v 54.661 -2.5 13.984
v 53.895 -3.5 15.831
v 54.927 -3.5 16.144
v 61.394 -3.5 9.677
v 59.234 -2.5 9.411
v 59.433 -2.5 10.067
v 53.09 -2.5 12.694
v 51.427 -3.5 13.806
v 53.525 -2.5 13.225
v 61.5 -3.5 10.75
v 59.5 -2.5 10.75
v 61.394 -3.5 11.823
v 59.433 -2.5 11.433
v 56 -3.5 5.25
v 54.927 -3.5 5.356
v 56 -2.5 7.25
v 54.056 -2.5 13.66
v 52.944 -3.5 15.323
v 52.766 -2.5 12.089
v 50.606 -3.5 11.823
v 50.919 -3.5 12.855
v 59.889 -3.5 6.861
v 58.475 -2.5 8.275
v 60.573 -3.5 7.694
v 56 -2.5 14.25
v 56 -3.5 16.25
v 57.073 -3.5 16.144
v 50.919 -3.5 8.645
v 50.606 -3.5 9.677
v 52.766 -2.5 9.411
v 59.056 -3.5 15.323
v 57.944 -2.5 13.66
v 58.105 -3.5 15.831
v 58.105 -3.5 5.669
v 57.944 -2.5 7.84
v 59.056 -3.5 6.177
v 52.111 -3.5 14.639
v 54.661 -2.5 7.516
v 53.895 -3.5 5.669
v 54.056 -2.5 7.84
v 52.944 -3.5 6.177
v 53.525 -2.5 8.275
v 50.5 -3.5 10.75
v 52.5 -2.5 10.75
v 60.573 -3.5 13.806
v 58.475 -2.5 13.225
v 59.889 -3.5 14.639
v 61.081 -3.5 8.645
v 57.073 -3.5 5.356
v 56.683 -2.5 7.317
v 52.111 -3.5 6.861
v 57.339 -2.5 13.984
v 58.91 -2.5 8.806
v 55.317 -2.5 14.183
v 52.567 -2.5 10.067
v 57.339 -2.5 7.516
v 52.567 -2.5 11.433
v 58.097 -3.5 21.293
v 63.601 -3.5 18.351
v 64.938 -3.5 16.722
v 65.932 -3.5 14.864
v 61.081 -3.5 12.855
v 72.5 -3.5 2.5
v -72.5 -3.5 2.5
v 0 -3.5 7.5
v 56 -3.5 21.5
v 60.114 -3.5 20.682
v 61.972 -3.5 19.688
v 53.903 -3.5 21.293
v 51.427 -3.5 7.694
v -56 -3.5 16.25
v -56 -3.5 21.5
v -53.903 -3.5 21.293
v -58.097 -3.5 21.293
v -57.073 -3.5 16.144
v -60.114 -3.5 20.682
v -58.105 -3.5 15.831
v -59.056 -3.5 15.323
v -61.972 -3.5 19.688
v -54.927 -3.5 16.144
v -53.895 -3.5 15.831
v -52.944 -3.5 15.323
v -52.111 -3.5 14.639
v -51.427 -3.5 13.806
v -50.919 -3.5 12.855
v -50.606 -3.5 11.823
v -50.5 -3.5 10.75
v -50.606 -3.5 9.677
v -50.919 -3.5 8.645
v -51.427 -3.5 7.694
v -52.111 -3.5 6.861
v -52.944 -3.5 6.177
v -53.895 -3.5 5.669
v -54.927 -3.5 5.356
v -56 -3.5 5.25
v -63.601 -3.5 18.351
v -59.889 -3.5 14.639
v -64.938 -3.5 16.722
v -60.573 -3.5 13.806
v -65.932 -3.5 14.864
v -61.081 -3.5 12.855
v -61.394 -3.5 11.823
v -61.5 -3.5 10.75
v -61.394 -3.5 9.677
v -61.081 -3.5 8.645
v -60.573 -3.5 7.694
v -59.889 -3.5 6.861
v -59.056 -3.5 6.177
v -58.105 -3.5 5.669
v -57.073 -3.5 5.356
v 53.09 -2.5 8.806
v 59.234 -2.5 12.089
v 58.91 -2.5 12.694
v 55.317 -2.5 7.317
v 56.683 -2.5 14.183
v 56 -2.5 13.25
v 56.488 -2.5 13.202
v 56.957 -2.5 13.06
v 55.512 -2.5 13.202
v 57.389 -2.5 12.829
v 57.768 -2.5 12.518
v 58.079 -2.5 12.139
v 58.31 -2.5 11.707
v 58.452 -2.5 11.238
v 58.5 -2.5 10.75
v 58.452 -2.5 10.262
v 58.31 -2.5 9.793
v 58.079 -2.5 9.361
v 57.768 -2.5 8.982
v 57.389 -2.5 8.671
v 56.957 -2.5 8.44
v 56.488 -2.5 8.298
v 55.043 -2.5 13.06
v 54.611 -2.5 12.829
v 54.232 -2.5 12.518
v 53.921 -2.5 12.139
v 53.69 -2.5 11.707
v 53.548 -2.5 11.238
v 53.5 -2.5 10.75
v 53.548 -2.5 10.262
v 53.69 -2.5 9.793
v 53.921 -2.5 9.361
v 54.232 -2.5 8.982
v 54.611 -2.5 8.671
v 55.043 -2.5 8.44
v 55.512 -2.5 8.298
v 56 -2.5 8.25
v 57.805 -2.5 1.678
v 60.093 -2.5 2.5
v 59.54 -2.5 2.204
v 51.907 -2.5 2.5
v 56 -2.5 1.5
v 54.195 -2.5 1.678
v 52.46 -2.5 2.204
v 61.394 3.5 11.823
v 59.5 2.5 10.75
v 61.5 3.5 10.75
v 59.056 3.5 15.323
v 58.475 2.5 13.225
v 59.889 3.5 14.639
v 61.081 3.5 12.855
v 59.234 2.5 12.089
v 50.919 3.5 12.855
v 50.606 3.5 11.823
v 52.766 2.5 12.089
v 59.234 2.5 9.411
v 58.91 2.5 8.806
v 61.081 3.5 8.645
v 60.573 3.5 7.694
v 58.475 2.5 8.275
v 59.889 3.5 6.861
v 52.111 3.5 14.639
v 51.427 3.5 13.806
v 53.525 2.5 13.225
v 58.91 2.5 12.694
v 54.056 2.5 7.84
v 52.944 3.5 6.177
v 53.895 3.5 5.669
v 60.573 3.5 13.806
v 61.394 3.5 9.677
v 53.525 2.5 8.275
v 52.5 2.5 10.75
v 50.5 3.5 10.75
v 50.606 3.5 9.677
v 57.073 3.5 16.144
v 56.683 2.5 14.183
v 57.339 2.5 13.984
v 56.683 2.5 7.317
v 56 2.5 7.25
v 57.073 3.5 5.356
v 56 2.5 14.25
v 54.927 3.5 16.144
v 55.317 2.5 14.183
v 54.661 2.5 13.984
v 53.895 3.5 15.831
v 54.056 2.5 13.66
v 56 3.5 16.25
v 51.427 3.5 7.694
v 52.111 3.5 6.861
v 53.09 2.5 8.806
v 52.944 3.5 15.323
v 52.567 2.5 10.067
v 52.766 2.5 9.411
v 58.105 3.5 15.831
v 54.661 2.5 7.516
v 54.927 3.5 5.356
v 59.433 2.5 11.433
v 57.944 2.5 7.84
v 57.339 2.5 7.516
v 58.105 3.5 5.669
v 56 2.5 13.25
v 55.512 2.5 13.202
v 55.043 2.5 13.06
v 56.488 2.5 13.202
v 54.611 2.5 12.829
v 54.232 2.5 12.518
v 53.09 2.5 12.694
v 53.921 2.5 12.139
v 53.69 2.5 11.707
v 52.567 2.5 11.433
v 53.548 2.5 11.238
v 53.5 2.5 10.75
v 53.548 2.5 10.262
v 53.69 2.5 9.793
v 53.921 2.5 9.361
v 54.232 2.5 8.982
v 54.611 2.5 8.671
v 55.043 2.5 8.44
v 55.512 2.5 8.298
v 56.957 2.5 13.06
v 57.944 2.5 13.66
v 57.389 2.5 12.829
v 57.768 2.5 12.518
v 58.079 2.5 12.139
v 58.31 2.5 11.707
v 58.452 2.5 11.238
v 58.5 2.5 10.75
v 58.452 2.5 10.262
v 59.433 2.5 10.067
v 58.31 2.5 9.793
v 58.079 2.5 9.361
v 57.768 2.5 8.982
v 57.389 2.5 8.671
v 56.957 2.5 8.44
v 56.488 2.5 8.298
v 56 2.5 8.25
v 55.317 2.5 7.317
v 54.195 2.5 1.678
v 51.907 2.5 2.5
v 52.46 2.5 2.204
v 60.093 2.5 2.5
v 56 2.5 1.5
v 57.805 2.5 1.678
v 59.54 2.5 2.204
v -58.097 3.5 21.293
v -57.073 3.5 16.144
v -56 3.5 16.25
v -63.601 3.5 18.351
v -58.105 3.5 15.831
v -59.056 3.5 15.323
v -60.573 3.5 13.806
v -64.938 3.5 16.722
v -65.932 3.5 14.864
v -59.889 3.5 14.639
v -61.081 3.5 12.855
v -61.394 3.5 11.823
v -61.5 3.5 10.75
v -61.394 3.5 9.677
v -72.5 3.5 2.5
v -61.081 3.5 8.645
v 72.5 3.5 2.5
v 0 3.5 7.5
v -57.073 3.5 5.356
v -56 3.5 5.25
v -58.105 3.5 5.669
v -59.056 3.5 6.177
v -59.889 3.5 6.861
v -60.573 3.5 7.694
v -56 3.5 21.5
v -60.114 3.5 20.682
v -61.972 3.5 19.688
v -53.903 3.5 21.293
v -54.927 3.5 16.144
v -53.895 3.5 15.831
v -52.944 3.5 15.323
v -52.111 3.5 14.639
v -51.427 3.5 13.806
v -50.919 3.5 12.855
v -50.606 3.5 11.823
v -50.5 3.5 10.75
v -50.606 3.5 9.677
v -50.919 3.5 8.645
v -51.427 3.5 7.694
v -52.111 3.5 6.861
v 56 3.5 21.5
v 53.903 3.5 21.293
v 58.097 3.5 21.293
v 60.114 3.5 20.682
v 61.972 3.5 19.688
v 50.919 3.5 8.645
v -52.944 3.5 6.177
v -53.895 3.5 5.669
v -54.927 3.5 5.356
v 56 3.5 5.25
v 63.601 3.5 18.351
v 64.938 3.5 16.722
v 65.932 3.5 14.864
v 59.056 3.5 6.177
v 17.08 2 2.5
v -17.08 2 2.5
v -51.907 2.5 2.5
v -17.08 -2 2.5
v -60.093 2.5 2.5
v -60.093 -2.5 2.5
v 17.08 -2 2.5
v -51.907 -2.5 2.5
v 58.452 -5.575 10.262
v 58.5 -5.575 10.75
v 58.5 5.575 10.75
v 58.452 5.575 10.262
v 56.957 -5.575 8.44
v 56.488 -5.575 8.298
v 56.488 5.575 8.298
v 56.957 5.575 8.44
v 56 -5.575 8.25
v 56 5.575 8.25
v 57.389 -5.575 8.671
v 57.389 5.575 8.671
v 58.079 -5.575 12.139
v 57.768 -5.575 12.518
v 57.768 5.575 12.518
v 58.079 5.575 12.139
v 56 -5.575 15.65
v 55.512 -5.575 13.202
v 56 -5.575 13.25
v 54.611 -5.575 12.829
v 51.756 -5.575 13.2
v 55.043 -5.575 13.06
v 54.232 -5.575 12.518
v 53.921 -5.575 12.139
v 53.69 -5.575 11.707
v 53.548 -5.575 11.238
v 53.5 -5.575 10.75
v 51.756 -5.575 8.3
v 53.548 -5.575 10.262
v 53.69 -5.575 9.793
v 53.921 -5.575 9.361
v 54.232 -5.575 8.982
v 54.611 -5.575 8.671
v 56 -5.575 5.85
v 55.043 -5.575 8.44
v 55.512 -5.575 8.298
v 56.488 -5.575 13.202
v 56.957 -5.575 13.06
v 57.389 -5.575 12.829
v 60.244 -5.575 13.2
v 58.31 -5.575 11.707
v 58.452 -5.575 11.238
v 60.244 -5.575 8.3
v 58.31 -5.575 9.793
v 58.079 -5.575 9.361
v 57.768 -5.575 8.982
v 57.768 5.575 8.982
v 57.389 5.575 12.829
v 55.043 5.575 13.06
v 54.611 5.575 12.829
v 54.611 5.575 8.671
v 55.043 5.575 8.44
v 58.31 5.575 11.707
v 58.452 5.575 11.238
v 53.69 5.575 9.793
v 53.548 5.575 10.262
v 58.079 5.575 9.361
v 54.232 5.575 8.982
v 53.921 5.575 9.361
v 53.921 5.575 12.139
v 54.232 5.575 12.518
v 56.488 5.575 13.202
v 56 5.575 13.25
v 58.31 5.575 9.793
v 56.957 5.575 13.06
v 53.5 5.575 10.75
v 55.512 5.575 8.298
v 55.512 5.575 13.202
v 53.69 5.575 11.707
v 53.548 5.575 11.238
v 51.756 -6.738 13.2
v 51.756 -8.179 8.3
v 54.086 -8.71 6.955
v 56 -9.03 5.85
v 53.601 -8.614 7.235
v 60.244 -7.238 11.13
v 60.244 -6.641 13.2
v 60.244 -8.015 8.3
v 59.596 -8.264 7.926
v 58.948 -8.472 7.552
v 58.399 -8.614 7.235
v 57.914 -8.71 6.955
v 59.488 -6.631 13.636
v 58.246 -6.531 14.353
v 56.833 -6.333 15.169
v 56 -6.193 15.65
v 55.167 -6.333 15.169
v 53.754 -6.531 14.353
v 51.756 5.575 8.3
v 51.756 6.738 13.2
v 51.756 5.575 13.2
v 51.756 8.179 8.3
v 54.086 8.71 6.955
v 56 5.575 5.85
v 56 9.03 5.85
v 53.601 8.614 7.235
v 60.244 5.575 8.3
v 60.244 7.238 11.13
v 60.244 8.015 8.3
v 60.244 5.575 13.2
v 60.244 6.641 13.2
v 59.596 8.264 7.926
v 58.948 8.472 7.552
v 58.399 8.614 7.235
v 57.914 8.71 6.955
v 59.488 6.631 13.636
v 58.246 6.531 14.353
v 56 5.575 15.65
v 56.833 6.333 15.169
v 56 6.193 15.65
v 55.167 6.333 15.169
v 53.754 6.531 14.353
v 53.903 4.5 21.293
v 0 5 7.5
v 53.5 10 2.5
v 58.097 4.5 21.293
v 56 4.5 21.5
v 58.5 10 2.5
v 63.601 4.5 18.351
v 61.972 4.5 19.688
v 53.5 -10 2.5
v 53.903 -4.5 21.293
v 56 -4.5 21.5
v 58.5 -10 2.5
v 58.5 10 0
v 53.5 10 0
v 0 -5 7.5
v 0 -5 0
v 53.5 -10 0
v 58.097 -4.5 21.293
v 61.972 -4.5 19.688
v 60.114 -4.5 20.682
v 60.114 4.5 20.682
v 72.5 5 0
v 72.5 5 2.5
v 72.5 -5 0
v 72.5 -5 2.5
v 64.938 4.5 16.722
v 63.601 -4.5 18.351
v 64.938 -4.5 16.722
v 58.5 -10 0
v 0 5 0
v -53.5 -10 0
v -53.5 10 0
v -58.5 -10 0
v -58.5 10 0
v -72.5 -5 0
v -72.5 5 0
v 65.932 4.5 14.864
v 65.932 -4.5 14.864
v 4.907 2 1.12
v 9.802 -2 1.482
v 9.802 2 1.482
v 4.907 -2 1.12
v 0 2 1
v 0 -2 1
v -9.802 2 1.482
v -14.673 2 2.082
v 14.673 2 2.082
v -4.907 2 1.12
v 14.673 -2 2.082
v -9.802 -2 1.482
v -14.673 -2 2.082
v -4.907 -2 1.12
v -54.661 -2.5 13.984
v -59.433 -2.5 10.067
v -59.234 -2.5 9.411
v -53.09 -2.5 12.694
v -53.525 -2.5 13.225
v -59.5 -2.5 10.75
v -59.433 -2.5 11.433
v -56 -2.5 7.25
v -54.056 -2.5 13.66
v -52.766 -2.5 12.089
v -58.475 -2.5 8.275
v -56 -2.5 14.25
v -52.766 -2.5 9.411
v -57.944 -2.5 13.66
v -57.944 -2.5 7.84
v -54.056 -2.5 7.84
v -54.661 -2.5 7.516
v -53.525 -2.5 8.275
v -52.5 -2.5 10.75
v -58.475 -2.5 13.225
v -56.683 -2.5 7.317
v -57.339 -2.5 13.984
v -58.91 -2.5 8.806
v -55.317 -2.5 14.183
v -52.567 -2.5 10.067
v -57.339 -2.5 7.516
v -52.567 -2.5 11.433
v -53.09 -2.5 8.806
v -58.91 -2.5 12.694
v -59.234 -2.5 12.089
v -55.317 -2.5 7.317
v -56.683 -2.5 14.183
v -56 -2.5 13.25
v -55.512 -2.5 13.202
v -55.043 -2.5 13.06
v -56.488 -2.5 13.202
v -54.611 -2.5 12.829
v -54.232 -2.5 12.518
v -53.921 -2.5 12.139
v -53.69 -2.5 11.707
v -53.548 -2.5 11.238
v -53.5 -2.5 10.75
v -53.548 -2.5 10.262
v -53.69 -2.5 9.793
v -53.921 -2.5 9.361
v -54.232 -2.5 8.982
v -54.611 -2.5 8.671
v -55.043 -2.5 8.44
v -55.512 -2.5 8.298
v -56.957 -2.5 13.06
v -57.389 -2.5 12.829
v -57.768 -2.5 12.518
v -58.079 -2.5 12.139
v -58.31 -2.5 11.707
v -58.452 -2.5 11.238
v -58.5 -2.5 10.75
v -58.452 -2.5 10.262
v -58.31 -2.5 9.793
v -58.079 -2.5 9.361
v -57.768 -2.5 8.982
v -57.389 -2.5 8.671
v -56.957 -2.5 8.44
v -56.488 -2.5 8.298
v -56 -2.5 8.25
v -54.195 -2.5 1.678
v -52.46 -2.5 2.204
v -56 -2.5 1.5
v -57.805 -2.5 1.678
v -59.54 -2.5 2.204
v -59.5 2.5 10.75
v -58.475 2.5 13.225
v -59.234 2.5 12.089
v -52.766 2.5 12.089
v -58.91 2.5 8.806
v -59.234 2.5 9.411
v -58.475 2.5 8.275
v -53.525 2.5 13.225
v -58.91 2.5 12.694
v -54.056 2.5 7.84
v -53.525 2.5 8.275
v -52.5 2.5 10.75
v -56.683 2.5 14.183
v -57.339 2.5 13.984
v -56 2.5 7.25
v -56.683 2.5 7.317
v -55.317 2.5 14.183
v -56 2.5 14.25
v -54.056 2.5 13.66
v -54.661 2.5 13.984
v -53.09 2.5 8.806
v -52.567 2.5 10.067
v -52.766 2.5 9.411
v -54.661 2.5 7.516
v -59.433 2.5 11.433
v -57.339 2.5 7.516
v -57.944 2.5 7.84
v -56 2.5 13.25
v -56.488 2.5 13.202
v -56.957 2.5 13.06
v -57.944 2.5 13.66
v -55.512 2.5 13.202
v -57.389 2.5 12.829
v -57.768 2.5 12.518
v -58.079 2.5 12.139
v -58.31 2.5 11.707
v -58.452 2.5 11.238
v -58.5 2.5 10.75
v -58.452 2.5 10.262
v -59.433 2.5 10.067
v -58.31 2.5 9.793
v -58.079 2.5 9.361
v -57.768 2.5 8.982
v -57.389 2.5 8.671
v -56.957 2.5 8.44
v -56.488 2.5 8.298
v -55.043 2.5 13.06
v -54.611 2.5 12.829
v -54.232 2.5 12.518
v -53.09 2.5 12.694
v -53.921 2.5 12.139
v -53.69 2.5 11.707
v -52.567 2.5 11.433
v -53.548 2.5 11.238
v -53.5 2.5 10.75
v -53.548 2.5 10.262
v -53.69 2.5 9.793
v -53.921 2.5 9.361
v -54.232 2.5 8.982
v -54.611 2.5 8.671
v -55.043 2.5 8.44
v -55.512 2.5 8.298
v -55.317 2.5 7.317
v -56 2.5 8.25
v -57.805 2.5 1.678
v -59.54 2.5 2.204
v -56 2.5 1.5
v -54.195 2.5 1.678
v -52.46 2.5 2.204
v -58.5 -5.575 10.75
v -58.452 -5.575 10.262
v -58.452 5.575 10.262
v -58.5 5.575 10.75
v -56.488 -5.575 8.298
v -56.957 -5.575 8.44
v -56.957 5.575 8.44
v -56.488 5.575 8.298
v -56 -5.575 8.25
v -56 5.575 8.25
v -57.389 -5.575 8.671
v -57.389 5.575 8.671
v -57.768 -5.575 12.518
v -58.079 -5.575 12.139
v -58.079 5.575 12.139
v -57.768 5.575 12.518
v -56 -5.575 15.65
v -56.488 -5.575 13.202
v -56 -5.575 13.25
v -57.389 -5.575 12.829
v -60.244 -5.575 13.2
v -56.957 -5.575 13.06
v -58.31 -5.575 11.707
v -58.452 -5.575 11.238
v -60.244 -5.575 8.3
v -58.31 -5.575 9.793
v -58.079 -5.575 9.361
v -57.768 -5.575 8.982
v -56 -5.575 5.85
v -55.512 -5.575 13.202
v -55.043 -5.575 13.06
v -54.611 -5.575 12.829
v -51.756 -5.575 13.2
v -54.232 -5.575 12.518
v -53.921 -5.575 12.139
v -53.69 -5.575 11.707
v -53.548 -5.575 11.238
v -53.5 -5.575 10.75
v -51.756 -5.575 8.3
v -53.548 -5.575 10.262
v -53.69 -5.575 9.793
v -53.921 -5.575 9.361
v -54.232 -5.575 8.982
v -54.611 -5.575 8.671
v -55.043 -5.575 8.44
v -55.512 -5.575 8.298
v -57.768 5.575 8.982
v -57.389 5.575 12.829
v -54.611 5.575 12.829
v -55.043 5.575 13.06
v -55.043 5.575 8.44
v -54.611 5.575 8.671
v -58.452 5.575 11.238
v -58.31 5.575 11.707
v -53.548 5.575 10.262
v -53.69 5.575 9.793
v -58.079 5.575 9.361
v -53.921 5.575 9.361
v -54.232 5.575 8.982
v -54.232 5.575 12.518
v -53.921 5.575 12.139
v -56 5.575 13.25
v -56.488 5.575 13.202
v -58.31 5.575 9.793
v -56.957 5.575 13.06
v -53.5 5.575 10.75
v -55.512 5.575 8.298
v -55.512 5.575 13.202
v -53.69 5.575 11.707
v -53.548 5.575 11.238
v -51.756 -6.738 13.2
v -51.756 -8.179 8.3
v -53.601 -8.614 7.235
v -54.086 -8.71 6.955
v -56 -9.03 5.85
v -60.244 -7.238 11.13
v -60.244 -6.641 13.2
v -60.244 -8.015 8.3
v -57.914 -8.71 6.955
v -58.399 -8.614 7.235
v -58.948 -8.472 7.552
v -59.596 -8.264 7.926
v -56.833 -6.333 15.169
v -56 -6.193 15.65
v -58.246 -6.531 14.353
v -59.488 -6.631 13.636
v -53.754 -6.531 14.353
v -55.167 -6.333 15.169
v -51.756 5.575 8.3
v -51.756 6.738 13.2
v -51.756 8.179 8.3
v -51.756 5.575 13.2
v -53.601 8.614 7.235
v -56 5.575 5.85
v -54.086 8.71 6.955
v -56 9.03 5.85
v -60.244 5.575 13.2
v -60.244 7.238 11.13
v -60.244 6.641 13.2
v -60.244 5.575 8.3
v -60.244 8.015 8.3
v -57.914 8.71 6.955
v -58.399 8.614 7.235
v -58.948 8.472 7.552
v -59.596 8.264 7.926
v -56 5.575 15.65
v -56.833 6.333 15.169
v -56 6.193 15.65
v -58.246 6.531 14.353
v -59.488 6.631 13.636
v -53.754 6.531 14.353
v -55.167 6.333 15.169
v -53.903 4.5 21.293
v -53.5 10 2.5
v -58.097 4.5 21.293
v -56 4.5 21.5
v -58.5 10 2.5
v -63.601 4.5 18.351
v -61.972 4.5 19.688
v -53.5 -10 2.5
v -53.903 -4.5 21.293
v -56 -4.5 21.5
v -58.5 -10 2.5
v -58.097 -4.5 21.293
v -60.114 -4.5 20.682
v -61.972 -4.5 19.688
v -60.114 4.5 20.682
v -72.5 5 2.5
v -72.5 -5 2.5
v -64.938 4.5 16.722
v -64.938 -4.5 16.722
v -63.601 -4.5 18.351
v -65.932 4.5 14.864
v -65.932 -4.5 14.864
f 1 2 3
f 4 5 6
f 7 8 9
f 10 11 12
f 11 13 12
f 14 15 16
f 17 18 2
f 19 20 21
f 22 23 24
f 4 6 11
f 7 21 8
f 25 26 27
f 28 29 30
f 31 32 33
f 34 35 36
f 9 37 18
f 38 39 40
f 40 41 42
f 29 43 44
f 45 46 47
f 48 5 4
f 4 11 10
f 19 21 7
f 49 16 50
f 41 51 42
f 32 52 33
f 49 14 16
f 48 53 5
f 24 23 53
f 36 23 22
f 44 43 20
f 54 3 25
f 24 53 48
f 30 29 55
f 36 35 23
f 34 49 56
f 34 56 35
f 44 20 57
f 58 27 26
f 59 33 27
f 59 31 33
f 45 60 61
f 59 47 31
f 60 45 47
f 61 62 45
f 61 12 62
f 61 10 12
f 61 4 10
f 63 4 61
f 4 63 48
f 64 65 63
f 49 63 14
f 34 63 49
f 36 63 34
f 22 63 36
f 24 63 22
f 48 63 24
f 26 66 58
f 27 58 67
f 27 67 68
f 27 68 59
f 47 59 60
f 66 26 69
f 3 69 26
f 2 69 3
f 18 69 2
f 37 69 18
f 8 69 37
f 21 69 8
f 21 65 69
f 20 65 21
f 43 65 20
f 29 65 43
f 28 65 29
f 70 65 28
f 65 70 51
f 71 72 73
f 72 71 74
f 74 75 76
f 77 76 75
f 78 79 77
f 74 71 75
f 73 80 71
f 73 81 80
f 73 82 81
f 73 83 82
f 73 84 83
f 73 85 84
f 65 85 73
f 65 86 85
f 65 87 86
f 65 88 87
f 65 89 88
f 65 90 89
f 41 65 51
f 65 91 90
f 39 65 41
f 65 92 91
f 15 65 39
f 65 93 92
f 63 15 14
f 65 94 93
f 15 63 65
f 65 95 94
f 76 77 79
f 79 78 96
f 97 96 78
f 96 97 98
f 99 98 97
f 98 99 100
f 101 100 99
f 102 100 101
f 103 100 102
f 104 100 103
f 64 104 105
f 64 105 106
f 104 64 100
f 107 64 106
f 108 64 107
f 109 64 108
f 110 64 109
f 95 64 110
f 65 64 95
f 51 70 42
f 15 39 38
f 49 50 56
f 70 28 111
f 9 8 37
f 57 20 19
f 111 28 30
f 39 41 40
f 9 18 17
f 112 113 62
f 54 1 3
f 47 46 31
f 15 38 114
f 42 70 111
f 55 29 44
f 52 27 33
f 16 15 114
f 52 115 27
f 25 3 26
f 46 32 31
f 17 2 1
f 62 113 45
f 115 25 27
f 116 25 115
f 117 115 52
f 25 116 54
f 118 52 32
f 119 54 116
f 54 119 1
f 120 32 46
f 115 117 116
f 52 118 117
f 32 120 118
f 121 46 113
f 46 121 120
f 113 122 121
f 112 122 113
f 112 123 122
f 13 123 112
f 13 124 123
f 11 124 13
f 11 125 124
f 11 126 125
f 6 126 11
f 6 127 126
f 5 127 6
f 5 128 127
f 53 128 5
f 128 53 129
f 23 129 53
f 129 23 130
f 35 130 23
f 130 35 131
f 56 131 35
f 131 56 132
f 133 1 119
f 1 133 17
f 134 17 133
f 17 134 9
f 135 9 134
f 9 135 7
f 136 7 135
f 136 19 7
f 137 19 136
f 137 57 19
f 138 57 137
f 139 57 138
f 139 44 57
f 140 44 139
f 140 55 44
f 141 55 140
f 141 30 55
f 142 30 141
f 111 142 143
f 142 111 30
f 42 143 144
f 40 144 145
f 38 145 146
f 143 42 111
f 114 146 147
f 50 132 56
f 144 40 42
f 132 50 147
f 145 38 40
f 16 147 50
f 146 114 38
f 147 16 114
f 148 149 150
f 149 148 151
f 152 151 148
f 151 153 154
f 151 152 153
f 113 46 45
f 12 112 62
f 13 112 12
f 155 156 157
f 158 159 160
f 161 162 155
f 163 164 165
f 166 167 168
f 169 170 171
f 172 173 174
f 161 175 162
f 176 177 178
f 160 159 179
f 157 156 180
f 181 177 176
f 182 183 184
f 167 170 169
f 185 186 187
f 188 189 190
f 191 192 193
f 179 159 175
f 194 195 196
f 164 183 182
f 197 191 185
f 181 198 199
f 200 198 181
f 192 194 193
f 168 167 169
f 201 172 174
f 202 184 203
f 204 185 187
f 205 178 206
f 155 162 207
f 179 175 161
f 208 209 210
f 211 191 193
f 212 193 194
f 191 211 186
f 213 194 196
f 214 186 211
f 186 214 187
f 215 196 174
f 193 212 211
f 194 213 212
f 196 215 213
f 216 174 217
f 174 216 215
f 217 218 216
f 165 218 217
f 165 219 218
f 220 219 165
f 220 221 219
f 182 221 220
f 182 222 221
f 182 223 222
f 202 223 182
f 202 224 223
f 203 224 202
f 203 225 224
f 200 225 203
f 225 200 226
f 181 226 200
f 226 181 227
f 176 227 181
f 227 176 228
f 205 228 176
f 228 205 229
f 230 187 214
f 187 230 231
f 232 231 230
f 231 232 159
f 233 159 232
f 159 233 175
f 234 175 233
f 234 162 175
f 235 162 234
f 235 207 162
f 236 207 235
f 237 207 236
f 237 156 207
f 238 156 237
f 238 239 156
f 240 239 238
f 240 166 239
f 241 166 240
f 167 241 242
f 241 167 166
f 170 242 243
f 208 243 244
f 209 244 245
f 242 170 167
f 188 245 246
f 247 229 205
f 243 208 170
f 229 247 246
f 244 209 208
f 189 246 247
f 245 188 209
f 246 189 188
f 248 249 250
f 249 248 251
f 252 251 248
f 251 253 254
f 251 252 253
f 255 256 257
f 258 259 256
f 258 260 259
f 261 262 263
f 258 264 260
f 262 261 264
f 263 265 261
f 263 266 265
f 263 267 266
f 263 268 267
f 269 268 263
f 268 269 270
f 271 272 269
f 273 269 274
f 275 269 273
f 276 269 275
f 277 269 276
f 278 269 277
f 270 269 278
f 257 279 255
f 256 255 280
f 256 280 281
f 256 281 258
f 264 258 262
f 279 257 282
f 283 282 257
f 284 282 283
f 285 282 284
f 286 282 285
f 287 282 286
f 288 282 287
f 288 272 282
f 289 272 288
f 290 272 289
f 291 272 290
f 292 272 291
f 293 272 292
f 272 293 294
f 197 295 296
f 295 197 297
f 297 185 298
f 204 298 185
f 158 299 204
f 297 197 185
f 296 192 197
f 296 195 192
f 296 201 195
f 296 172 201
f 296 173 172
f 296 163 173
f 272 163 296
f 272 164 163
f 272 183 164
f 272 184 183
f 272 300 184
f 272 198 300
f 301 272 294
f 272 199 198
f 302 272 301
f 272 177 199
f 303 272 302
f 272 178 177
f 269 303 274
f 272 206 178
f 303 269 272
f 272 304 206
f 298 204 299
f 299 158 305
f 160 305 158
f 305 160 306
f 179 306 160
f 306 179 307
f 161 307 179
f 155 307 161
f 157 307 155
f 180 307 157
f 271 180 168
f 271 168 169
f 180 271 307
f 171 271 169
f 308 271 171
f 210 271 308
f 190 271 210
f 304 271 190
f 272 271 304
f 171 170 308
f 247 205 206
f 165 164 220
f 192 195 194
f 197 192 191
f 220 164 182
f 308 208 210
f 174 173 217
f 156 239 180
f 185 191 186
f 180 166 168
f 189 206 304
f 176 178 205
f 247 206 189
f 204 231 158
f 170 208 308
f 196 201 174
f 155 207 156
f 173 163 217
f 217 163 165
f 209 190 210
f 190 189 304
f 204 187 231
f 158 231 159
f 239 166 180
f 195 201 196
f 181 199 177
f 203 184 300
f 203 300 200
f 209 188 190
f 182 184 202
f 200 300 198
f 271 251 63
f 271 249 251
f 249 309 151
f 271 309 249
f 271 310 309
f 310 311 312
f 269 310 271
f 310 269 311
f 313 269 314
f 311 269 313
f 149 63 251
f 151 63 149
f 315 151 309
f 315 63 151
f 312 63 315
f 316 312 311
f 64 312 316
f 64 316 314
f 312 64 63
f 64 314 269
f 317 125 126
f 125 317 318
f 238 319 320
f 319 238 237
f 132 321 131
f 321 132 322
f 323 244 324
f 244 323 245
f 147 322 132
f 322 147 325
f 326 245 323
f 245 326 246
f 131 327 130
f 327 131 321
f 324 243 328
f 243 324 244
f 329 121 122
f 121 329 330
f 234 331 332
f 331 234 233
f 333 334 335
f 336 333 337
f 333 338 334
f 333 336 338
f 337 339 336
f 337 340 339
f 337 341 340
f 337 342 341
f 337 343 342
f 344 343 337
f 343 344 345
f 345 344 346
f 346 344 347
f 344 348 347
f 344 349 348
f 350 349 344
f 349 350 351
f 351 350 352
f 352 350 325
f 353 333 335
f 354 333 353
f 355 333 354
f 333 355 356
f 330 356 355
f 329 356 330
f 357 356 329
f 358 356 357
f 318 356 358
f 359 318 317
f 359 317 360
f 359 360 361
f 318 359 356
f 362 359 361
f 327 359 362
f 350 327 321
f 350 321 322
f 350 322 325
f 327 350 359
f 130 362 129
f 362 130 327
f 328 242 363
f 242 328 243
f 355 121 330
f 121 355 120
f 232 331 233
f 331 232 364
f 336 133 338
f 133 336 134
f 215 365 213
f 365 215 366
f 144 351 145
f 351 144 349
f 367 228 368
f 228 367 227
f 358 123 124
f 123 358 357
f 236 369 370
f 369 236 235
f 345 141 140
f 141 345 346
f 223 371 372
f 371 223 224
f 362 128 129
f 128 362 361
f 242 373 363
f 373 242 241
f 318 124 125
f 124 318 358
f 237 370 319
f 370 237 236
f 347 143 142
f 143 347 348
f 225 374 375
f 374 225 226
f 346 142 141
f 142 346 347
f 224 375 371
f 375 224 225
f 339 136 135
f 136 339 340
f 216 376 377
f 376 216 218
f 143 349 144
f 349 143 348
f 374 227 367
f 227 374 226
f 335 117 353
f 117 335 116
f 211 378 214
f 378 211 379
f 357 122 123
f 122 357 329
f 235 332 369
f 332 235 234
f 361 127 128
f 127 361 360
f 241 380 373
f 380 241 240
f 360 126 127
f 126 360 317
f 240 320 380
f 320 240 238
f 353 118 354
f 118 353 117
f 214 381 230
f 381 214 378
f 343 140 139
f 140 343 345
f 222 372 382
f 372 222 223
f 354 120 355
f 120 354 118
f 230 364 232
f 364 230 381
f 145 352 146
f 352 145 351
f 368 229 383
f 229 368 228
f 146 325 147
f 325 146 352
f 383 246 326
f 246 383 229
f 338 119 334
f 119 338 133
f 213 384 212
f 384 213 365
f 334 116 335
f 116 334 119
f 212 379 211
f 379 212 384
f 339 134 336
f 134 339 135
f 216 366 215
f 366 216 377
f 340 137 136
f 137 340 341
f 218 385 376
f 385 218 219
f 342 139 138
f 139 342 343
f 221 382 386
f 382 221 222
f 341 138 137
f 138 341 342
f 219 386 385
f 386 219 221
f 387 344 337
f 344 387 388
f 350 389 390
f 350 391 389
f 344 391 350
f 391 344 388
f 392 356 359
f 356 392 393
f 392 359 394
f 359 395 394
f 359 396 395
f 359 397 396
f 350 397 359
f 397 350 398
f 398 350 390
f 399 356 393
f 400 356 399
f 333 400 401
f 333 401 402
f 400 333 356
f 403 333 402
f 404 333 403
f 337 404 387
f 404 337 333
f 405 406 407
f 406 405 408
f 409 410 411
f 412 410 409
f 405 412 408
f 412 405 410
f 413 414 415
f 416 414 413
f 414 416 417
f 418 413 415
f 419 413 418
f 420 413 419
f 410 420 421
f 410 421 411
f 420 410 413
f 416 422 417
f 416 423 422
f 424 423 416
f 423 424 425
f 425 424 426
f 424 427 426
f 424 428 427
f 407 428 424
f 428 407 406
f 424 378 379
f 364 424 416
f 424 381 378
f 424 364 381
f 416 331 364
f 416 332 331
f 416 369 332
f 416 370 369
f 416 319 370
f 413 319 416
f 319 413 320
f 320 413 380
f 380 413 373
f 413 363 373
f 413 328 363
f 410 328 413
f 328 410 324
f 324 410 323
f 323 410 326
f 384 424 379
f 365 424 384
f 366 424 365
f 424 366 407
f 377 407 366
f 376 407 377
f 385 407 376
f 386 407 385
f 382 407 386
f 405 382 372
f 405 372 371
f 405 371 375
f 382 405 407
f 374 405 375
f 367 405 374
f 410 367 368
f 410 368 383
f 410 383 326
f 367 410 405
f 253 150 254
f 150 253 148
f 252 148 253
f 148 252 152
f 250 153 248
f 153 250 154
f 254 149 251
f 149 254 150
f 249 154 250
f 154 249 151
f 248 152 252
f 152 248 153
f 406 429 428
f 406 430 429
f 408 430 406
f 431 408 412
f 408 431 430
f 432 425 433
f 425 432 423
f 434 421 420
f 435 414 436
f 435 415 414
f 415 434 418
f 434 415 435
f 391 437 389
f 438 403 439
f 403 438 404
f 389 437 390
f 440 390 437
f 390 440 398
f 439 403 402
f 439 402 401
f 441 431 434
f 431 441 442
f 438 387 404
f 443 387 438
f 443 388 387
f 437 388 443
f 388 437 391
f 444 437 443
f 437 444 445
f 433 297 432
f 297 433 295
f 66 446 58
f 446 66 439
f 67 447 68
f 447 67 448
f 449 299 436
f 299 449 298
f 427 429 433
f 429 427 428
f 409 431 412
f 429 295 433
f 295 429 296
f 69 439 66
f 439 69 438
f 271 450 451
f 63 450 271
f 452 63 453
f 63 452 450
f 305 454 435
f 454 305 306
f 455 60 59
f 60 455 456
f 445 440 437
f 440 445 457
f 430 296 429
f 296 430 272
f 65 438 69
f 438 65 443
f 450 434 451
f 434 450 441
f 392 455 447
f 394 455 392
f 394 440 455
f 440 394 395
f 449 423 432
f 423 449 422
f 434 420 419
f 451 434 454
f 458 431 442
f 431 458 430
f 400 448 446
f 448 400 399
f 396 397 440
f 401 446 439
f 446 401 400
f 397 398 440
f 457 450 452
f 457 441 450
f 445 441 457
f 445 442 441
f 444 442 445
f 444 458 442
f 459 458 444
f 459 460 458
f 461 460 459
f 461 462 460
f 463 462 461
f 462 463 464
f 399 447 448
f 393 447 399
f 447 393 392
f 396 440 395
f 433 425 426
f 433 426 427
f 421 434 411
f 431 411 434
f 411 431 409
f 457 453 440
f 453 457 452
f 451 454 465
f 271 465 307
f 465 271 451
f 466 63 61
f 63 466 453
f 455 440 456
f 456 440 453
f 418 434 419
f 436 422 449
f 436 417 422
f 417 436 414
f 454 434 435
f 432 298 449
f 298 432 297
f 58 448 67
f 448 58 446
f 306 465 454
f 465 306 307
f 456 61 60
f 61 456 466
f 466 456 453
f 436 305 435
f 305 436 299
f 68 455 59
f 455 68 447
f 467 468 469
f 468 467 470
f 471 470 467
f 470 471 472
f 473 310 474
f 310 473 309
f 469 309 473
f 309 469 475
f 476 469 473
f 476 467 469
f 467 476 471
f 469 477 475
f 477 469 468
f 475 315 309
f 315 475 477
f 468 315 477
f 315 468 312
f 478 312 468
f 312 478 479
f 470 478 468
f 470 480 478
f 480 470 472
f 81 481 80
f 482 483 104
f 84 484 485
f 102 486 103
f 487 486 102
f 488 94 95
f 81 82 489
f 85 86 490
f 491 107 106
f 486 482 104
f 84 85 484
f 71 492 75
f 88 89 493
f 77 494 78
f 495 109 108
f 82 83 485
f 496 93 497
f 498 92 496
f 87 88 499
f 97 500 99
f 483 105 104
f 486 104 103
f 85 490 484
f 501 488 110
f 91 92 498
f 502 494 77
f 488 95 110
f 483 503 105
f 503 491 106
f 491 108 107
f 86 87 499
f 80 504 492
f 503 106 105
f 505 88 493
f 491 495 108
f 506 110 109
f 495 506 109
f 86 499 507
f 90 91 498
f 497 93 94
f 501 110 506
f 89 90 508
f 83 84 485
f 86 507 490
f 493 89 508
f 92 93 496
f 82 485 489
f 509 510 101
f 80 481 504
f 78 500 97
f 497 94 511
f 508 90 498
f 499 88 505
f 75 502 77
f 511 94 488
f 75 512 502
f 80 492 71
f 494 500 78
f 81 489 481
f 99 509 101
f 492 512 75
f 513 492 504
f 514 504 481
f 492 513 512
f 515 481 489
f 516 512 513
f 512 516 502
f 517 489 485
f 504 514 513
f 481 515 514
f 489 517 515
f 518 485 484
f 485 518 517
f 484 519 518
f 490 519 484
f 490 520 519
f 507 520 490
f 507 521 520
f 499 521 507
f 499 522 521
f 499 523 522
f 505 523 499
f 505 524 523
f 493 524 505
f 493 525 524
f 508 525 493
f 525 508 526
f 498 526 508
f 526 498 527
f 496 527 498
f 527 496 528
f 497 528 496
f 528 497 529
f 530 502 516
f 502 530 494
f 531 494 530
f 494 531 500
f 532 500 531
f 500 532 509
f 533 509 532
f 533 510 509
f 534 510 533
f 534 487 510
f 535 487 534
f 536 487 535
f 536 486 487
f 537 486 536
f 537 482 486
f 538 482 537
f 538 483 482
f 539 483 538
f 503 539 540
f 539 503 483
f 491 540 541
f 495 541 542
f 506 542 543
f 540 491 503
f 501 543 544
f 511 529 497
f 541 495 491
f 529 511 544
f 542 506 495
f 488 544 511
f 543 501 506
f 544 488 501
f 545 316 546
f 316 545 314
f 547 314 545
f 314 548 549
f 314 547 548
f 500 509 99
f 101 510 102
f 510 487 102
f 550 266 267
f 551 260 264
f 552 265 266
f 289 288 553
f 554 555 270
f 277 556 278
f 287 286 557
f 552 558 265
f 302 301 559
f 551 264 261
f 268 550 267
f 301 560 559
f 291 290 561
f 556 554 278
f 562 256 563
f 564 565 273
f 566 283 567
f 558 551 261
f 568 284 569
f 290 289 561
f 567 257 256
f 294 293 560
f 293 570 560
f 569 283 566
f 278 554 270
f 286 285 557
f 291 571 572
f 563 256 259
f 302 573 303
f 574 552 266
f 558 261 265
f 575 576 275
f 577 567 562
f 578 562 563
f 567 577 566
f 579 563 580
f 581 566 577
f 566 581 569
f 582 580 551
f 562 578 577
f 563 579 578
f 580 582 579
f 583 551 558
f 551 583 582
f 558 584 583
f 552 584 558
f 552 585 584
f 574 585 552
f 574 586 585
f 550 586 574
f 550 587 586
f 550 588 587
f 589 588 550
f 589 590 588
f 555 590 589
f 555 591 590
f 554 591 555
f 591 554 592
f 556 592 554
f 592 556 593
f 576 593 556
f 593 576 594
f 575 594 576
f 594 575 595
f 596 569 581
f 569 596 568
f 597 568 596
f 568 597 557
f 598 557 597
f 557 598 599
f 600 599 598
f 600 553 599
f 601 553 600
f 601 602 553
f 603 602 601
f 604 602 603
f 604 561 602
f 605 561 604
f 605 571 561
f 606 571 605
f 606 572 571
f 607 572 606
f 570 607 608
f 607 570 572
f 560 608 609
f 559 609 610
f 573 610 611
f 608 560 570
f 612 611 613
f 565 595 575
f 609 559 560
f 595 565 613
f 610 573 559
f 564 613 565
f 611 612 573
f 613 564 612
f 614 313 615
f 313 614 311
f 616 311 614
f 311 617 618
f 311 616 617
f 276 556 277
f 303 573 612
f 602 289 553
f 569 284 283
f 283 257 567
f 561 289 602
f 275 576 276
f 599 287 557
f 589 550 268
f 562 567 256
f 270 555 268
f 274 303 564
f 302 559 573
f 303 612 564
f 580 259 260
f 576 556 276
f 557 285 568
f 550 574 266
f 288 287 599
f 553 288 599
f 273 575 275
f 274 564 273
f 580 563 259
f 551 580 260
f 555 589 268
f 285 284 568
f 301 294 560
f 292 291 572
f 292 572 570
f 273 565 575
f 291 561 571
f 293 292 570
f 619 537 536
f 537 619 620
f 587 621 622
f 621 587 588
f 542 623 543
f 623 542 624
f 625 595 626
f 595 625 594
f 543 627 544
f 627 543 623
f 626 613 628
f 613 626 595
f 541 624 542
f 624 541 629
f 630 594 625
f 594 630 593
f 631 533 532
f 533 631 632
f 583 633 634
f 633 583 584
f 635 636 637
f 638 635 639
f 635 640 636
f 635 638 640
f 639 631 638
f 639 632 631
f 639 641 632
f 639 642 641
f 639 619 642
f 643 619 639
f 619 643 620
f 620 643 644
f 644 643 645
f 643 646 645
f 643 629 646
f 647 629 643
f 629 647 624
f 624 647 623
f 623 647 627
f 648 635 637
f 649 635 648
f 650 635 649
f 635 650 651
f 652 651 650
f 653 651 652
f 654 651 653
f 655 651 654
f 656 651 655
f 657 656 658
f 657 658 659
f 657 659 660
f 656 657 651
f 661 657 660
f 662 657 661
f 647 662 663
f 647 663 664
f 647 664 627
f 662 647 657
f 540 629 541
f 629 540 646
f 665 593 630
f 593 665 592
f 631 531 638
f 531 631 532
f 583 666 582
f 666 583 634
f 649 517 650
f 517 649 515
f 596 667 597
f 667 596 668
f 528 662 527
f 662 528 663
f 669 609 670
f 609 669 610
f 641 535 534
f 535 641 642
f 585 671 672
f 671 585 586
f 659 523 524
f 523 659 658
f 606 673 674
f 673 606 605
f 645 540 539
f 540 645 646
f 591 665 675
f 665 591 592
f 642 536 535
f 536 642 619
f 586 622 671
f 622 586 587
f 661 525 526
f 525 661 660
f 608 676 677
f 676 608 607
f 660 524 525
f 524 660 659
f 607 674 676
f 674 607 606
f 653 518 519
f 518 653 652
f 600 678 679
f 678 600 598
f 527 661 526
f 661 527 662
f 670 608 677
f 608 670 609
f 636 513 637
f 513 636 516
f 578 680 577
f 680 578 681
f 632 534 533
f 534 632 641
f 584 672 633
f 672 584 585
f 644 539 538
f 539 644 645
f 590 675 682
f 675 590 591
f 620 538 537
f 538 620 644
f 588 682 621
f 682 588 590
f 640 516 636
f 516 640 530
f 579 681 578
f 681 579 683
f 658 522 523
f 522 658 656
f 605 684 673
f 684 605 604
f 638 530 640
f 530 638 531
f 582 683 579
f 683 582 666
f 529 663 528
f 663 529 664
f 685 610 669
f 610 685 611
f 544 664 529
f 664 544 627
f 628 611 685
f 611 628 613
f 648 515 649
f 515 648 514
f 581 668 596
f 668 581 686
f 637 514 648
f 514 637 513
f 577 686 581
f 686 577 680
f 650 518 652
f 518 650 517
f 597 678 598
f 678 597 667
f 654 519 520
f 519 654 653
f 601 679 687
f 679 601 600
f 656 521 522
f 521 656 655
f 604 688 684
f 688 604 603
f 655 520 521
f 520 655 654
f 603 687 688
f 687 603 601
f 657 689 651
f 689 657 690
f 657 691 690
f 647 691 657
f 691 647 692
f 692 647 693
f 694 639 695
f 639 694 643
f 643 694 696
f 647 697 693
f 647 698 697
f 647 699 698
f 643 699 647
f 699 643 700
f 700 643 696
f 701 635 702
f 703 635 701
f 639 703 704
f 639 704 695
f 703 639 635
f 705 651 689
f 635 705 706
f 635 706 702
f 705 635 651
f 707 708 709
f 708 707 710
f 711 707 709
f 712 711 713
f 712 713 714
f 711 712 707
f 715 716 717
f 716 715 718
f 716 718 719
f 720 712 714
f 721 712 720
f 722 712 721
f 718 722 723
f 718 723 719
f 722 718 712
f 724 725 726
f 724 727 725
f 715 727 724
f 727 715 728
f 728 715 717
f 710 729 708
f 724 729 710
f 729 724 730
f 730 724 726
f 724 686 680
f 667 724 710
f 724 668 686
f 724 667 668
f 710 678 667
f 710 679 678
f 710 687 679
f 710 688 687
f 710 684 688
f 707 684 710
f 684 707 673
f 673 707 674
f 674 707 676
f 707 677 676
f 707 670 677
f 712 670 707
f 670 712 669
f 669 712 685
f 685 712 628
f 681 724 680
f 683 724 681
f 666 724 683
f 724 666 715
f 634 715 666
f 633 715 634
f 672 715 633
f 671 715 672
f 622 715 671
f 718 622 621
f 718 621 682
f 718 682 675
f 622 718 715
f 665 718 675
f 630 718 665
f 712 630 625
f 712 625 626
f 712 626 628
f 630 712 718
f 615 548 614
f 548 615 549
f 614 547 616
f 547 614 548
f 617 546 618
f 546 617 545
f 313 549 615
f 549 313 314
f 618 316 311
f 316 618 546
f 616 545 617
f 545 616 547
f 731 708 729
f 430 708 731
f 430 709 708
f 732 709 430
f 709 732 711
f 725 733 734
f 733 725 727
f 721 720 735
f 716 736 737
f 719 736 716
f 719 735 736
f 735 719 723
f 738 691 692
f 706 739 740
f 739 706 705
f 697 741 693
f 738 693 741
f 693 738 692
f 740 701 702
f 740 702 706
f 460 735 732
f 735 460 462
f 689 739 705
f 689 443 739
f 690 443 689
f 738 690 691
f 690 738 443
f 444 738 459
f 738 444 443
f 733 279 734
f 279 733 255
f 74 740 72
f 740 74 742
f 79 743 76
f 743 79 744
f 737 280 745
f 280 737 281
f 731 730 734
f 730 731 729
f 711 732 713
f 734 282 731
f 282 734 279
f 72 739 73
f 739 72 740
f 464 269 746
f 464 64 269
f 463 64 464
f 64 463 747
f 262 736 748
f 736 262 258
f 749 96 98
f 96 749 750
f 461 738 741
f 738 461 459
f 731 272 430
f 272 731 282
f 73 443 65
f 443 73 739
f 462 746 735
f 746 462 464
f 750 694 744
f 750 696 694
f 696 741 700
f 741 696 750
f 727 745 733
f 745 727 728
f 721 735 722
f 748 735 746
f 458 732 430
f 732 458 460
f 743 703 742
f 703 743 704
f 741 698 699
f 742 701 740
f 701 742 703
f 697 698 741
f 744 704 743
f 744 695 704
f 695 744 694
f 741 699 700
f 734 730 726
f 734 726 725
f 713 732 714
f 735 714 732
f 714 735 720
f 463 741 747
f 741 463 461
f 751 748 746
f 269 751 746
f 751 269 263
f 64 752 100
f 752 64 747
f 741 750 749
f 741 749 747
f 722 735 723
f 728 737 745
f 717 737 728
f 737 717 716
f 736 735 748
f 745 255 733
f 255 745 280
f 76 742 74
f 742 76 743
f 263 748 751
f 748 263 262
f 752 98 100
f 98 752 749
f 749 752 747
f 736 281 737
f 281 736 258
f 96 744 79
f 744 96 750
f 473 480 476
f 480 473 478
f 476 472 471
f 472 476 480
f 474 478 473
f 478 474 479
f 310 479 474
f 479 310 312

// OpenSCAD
bearing_od = 16+0.5;
bearing_id = 5;
bearing_h  = 5;

spool_d = 200;

roller_lh = 2.5;
roller_bl = 56; // empirically attained

$fn = 32;

module rollOfQuarters() {

    difference() {

        width = 10;
        length = roller_bl + bearing_od;
        stand = width*2;

        hull() {
            hull() {
                
                translate([0,-width/2,0])
                cube([length, width, roller_lh]);
                
                translate([roller_bl, 0, roller_lh/2])
                cube([5, stand, roller_lh], center=true);
            }

            //guard rail
            translate([roller_bl,bearing_h/2+2,bearing_od/2+roller_lh]) {
                rotate([90,0,0]) cylinder(d=bearing_od+5, h=bearing_h+4);
            }

            translate([0,-width/2,0]) cube([1, width, 7.5]);

        }

        // spool cutout
        difference() {
            cutout_w = bearing_h+2;
            translate([0,-cutout_w/2,roller_lh])
            cube([length+1, cutout_w, 40]);

            translate([roller_bl, 0, bearing_od/2+roller_lh]) {
                rotate([90,0,0]) {
                    translate([0,0,cutout_w/2-1])
                    cylinder(r1=bearing_id/2+1, r2=bearing_id/2+3, h=1);

                    translate([0,0,-cutout_w/2])
                    cylinder(r1=bearing_id/2+3, r2=bearing_id/2+1, h=1);
                }
            }
        }

        // bearing post
        //guard rail
        m5ScrewLength = 15;
        m5NutWidth = 9+0.8;
        m5NutHeight = 3.85;

        translate([roller_bl, 0, bearing_od/2+roller_lh]) {
            rotate([90,90,0]) {
                
                translate([0,0,-m5NutHeight/2-m5ScrewLength/2]) cylinder(d=bearing_id, h=m5ScrewLength);
                
                translate([0,0,-m5NutHeight/2+m5ScrewLength/2]) cylinder(d=m5NutWidth, h=m5NutHeight, $fn=6);
                translate([0,0,-m5NutHeight/2-m5ScrewLength/2]) cylinder(d=m5NutWidth, h=m5NutHeight, $fn=6);

                translate([0, 0,-bearing_h/2]) cylinder(d=bearing_od+2, h=bearing_h);
            }
        }

        translate([0,2,spool_d/2+1]) rotate([90,0,0]) cylinder(d=spool_d, $fn=128, h=4);

    }

}

rollOfQuarters();
mirror([1,0,0]) rollOfQuarters();
